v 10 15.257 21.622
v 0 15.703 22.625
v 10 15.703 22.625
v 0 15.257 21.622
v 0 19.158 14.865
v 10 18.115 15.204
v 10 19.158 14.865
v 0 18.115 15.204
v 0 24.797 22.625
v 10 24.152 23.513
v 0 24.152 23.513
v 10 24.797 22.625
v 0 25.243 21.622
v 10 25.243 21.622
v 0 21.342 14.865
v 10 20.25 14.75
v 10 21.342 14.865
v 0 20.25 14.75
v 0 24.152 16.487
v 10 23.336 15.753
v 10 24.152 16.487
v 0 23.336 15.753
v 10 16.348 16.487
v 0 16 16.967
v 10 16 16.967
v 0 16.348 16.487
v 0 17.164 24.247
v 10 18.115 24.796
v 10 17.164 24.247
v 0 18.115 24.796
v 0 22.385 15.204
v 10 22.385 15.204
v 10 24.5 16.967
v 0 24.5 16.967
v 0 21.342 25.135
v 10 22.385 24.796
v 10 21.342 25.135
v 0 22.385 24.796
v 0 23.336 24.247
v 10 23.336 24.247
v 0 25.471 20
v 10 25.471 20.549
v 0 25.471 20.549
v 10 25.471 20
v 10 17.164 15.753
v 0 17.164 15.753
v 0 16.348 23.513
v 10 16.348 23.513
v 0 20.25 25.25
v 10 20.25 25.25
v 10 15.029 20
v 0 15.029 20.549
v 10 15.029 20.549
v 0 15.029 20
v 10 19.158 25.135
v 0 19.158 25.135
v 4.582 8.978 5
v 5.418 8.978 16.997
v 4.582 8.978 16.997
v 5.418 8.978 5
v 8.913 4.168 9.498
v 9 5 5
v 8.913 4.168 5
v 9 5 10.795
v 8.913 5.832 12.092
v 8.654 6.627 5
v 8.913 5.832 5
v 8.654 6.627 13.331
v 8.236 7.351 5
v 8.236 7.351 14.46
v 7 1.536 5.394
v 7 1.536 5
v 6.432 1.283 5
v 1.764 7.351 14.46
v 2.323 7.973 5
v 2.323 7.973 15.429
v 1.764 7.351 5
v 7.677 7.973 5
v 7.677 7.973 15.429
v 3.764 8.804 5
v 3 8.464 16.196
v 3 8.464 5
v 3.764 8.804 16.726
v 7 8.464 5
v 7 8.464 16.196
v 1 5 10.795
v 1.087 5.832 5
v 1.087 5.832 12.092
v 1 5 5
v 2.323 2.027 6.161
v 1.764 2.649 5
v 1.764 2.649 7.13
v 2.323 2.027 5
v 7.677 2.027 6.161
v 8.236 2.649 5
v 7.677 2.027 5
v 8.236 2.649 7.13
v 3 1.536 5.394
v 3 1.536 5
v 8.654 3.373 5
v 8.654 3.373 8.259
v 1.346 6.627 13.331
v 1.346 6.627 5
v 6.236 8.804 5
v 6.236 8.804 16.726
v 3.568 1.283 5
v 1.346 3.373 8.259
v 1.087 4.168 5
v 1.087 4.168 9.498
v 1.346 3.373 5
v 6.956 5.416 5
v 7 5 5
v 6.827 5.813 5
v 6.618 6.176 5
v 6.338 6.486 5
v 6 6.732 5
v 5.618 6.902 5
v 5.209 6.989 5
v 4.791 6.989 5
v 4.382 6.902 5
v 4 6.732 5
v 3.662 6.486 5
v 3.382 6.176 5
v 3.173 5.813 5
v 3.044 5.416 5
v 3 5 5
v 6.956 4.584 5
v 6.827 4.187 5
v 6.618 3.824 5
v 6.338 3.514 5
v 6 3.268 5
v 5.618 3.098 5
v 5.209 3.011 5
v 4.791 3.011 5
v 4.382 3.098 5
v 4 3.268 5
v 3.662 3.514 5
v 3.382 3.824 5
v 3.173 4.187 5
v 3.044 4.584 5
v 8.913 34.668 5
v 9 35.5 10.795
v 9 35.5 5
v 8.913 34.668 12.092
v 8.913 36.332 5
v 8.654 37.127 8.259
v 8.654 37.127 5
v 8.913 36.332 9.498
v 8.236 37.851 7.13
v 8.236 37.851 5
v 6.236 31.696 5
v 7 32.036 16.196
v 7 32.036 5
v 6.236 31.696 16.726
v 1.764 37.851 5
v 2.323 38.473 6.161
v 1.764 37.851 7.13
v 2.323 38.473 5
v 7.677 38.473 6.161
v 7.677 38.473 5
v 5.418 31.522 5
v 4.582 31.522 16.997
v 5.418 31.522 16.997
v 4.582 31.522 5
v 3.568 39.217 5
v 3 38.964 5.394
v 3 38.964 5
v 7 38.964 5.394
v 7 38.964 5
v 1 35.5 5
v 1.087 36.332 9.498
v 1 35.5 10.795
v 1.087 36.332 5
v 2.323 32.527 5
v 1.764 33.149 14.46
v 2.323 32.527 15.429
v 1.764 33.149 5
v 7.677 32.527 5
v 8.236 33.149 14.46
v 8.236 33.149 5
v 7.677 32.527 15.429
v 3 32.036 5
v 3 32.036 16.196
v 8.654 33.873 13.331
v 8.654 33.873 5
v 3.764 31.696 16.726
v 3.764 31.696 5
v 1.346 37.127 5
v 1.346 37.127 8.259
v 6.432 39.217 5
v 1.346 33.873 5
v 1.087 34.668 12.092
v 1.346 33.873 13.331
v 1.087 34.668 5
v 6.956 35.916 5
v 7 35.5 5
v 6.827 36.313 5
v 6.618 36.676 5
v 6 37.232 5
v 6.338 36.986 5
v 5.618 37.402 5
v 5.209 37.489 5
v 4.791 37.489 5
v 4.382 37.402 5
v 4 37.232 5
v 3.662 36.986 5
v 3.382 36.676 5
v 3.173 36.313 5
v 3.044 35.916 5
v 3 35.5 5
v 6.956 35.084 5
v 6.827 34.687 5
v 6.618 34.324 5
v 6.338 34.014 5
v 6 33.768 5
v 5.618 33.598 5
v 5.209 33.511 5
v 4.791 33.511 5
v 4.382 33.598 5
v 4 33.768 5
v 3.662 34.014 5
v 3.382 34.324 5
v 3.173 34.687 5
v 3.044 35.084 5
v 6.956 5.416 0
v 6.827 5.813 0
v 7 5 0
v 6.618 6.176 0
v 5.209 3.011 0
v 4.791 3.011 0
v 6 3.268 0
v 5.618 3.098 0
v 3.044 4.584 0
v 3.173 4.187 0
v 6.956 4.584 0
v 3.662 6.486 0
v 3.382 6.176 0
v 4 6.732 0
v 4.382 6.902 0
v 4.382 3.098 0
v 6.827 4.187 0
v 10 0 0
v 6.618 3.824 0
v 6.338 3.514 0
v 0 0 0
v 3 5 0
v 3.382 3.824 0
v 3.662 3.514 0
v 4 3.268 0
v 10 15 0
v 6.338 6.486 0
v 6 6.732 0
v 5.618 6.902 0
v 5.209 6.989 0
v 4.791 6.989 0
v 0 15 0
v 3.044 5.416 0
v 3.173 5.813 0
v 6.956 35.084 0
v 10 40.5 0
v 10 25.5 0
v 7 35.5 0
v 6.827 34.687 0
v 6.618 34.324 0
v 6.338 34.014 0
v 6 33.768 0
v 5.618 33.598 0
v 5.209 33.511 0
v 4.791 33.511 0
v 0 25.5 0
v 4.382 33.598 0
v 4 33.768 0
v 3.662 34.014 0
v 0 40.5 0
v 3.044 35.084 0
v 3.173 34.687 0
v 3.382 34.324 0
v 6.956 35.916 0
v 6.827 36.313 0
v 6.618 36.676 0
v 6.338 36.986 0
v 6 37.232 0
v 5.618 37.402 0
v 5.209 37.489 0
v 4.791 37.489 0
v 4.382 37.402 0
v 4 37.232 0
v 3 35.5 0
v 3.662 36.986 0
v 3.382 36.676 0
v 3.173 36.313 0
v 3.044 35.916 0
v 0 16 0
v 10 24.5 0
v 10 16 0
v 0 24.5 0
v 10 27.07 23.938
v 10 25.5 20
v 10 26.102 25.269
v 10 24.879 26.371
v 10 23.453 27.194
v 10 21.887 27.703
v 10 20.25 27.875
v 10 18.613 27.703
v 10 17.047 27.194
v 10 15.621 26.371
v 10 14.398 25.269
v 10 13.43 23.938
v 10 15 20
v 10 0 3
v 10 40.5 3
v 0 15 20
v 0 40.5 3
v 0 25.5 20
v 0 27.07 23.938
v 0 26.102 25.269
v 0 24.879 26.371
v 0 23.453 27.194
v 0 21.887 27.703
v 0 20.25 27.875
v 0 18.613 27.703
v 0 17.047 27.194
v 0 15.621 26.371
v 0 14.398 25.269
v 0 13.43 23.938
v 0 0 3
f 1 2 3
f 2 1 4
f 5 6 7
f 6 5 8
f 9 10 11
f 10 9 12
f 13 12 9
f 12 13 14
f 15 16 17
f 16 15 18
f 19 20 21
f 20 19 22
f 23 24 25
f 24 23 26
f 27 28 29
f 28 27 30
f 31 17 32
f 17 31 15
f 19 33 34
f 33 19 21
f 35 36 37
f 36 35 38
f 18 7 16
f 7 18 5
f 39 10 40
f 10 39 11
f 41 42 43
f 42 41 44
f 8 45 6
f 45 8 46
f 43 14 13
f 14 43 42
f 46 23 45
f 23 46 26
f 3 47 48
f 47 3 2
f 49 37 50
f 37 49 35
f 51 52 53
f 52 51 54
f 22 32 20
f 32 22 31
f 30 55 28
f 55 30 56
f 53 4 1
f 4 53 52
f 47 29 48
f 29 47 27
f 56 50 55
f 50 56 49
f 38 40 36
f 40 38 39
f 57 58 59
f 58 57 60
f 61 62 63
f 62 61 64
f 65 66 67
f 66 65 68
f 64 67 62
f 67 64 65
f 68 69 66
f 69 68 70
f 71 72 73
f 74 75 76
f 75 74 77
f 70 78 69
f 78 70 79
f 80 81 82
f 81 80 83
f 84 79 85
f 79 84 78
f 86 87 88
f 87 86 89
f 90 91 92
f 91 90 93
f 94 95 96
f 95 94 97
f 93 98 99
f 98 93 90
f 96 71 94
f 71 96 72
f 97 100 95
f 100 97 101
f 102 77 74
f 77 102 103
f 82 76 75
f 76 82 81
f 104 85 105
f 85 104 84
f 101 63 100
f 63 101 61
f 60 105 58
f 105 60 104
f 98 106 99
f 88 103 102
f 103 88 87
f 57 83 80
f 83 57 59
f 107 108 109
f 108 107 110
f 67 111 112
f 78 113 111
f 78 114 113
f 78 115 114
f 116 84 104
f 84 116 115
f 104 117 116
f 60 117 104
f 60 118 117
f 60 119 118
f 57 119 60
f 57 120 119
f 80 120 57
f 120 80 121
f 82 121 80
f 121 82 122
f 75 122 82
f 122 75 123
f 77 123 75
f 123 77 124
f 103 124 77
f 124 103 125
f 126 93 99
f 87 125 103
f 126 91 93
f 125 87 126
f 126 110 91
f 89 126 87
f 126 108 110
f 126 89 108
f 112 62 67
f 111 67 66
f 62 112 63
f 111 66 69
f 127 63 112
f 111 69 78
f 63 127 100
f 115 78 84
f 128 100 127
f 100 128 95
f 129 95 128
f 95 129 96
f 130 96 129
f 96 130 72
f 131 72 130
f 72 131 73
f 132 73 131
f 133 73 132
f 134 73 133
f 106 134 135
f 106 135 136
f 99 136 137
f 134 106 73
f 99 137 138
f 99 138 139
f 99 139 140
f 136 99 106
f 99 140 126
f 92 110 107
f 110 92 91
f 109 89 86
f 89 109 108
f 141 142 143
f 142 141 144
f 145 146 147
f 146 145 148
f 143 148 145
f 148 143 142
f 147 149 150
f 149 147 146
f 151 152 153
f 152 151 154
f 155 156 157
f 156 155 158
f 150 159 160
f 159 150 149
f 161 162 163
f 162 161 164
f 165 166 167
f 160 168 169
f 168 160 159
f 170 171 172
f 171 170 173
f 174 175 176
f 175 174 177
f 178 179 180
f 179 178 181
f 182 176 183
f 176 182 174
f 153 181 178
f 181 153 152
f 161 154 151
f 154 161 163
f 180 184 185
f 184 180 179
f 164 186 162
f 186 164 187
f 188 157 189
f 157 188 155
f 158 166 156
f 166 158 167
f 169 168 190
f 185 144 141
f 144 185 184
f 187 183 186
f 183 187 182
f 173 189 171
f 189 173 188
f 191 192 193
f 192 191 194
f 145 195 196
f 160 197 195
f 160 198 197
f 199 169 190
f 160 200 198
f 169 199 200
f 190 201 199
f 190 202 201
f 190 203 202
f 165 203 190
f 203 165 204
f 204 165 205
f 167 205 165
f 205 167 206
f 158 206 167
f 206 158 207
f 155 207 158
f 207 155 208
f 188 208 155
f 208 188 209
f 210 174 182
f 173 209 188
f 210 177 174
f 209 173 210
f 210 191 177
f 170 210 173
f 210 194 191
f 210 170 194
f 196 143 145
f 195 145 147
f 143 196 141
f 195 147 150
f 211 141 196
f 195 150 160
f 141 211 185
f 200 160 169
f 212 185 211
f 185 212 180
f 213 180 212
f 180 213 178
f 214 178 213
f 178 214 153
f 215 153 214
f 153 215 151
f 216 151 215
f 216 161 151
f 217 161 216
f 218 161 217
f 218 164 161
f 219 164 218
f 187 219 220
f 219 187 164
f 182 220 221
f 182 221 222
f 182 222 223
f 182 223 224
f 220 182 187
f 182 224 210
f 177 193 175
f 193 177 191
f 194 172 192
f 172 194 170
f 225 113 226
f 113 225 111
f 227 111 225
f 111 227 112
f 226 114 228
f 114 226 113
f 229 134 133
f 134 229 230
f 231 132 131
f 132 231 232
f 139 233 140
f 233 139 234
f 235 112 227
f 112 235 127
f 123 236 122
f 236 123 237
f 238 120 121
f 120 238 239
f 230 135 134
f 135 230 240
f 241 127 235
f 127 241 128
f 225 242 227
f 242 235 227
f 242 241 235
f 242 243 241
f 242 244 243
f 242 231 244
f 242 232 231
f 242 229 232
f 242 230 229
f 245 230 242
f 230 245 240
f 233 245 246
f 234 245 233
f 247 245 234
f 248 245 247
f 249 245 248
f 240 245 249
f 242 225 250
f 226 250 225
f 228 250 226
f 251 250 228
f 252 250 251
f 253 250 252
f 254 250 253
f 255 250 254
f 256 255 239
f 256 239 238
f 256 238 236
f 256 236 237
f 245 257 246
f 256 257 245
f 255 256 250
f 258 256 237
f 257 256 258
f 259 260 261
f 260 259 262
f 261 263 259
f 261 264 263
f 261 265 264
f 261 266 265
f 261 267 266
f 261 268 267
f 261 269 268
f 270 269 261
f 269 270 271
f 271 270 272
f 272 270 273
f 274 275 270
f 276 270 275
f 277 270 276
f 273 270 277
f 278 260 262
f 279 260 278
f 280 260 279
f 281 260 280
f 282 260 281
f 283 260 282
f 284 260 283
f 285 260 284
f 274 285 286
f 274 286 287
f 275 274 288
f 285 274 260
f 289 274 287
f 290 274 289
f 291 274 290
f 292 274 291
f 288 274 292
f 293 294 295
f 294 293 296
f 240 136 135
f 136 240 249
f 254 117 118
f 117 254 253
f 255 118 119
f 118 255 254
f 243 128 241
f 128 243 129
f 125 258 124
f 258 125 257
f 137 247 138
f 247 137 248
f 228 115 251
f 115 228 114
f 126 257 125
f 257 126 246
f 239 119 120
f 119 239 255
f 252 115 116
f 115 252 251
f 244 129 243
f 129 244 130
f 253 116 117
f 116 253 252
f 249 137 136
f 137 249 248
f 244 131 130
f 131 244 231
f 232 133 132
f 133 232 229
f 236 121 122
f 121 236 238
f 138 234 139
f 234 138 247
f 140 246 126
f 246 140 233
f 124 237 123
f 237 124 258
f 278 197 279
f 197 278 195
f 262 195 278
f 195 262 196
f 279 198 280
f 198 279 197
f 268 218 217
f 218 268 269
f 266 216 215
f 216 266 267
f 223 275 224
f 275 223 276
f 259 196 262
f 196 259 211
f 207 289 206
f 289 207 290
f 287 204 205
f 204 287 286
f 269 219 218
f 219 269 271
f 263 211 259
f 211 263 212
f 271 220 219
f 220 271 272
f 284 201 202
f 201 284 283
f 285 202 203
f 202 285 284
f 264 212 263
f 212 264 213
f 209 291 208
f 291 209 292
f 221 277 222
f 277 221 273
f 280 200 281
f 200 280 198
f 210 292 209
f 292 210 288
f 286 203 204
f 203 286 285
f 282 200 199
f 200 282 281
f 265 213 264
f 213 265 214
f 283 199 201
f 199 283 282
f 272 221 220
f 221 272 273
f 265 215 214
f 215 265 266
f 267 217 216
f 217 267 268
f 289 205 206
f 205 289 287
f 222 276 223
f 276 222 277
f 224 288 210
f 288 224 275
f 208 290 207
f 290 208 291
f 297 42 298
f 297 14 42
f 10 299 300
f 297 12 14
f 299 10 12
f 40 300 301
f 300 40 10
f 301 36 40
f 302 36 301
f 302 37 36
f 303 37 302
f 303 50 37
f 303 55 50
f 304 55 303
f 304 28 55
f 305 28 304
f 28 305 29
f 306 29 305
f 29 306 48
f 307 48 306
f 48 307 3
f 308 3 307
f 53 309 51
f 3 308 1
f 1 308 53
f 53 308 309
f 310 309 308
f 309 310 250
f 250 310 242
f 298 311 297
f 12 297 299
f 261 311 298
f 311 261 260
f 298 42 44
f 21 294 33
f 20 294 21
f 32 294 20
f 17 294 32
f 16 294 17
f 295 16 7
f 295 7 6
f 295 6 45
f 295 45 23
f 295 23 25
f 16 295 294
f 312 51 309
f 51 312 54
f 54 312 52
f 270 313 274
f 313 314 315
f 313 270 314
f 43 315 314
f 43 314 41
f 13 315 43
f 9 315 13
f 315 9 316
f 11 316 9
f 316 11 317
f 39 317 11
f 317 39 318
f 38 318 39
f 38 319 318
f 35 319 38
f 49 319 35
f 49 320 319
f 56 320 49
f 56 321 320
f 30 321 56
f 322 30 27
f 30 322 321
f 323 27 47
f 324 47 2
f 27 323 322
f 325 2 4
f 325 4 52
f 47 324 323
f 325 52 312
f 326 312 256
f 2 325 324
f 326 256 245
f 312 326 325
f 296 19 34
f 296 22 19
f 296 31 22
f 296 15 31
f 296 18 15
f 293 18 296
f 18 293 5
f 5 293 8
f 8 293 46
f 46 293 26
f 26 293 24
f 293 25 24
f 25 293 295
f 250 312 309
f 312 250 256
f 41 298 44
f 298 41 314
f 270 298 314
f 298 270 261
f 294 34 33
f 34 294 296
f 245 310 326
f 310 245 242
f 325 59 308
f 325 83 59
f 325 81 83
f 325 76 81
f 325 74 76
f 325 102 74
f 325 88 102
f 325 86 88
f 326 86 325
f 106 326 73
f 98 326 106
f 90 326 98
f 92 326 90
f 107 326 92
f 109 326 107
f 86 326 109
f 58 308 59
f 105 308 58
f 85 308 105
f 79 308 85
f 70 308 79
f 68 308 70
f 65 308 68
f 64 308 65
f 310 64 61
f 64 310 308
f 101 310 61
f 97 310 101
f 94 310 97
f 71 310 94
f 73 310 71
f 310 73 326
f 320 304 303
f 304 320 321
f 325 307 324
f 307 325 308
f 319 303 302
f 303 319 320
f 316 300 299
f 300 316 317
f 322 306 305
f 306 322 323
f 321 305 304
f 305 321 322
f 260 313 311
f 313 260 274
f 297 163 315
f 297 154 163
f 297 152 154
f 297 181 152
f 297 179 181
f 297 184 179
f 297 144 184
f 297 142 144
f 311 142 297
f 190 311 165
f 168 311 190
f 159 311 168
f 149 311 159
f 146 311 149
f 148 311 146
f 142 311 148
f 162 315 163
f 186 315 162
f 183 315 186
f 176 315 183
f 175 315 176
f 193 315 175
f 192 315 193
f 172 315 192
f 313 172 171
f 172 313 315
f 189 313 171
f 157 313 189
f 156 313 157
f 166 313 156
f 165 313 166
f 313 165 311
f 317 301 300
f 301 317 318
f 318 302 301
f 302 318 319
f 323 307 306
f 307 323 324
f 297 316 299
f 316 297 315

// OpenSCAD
$fn=30;
prumer = 10.5; //the diameter of the threaded rod [mm]
vyska  = 20.0; //the height of the threaded rod[mm] 

difference()
{
    union()
    {
        hull() 
        {
            cube([10,(prumer+30),3]);
            translate([0,((prumer+30)/2),vyska]) rotate([0,90,0]) cylinder(d=(prumer*1.5),h=10);
        }
    }
    union()
    {
        translate([-0.5,((prumer+30)/2),vyska]) rotate([0,90,0]) cylinder(d=prumer,h=11);
        translate([5,5,5]) rotate([0,0,0]) cylinder(d=8,h=vyska+prumer);
        translate([5,(prumer+25),5]) rotate([0,0,0]) cylinder(d=8,h=vyska+prumer);
        translate([5,5,0]) rotate([0,0,0]) cylinder(d=4,h=50);
        translate([5,(prumer+25),0]) rotate([0,0,0]) cylinder(d=4,h=50);
        translate([0,15,0]) cube([10,1,vyska]);
        translate([0,(prumer+14),0]) cube([10,1,vyska]);
    }    
}
